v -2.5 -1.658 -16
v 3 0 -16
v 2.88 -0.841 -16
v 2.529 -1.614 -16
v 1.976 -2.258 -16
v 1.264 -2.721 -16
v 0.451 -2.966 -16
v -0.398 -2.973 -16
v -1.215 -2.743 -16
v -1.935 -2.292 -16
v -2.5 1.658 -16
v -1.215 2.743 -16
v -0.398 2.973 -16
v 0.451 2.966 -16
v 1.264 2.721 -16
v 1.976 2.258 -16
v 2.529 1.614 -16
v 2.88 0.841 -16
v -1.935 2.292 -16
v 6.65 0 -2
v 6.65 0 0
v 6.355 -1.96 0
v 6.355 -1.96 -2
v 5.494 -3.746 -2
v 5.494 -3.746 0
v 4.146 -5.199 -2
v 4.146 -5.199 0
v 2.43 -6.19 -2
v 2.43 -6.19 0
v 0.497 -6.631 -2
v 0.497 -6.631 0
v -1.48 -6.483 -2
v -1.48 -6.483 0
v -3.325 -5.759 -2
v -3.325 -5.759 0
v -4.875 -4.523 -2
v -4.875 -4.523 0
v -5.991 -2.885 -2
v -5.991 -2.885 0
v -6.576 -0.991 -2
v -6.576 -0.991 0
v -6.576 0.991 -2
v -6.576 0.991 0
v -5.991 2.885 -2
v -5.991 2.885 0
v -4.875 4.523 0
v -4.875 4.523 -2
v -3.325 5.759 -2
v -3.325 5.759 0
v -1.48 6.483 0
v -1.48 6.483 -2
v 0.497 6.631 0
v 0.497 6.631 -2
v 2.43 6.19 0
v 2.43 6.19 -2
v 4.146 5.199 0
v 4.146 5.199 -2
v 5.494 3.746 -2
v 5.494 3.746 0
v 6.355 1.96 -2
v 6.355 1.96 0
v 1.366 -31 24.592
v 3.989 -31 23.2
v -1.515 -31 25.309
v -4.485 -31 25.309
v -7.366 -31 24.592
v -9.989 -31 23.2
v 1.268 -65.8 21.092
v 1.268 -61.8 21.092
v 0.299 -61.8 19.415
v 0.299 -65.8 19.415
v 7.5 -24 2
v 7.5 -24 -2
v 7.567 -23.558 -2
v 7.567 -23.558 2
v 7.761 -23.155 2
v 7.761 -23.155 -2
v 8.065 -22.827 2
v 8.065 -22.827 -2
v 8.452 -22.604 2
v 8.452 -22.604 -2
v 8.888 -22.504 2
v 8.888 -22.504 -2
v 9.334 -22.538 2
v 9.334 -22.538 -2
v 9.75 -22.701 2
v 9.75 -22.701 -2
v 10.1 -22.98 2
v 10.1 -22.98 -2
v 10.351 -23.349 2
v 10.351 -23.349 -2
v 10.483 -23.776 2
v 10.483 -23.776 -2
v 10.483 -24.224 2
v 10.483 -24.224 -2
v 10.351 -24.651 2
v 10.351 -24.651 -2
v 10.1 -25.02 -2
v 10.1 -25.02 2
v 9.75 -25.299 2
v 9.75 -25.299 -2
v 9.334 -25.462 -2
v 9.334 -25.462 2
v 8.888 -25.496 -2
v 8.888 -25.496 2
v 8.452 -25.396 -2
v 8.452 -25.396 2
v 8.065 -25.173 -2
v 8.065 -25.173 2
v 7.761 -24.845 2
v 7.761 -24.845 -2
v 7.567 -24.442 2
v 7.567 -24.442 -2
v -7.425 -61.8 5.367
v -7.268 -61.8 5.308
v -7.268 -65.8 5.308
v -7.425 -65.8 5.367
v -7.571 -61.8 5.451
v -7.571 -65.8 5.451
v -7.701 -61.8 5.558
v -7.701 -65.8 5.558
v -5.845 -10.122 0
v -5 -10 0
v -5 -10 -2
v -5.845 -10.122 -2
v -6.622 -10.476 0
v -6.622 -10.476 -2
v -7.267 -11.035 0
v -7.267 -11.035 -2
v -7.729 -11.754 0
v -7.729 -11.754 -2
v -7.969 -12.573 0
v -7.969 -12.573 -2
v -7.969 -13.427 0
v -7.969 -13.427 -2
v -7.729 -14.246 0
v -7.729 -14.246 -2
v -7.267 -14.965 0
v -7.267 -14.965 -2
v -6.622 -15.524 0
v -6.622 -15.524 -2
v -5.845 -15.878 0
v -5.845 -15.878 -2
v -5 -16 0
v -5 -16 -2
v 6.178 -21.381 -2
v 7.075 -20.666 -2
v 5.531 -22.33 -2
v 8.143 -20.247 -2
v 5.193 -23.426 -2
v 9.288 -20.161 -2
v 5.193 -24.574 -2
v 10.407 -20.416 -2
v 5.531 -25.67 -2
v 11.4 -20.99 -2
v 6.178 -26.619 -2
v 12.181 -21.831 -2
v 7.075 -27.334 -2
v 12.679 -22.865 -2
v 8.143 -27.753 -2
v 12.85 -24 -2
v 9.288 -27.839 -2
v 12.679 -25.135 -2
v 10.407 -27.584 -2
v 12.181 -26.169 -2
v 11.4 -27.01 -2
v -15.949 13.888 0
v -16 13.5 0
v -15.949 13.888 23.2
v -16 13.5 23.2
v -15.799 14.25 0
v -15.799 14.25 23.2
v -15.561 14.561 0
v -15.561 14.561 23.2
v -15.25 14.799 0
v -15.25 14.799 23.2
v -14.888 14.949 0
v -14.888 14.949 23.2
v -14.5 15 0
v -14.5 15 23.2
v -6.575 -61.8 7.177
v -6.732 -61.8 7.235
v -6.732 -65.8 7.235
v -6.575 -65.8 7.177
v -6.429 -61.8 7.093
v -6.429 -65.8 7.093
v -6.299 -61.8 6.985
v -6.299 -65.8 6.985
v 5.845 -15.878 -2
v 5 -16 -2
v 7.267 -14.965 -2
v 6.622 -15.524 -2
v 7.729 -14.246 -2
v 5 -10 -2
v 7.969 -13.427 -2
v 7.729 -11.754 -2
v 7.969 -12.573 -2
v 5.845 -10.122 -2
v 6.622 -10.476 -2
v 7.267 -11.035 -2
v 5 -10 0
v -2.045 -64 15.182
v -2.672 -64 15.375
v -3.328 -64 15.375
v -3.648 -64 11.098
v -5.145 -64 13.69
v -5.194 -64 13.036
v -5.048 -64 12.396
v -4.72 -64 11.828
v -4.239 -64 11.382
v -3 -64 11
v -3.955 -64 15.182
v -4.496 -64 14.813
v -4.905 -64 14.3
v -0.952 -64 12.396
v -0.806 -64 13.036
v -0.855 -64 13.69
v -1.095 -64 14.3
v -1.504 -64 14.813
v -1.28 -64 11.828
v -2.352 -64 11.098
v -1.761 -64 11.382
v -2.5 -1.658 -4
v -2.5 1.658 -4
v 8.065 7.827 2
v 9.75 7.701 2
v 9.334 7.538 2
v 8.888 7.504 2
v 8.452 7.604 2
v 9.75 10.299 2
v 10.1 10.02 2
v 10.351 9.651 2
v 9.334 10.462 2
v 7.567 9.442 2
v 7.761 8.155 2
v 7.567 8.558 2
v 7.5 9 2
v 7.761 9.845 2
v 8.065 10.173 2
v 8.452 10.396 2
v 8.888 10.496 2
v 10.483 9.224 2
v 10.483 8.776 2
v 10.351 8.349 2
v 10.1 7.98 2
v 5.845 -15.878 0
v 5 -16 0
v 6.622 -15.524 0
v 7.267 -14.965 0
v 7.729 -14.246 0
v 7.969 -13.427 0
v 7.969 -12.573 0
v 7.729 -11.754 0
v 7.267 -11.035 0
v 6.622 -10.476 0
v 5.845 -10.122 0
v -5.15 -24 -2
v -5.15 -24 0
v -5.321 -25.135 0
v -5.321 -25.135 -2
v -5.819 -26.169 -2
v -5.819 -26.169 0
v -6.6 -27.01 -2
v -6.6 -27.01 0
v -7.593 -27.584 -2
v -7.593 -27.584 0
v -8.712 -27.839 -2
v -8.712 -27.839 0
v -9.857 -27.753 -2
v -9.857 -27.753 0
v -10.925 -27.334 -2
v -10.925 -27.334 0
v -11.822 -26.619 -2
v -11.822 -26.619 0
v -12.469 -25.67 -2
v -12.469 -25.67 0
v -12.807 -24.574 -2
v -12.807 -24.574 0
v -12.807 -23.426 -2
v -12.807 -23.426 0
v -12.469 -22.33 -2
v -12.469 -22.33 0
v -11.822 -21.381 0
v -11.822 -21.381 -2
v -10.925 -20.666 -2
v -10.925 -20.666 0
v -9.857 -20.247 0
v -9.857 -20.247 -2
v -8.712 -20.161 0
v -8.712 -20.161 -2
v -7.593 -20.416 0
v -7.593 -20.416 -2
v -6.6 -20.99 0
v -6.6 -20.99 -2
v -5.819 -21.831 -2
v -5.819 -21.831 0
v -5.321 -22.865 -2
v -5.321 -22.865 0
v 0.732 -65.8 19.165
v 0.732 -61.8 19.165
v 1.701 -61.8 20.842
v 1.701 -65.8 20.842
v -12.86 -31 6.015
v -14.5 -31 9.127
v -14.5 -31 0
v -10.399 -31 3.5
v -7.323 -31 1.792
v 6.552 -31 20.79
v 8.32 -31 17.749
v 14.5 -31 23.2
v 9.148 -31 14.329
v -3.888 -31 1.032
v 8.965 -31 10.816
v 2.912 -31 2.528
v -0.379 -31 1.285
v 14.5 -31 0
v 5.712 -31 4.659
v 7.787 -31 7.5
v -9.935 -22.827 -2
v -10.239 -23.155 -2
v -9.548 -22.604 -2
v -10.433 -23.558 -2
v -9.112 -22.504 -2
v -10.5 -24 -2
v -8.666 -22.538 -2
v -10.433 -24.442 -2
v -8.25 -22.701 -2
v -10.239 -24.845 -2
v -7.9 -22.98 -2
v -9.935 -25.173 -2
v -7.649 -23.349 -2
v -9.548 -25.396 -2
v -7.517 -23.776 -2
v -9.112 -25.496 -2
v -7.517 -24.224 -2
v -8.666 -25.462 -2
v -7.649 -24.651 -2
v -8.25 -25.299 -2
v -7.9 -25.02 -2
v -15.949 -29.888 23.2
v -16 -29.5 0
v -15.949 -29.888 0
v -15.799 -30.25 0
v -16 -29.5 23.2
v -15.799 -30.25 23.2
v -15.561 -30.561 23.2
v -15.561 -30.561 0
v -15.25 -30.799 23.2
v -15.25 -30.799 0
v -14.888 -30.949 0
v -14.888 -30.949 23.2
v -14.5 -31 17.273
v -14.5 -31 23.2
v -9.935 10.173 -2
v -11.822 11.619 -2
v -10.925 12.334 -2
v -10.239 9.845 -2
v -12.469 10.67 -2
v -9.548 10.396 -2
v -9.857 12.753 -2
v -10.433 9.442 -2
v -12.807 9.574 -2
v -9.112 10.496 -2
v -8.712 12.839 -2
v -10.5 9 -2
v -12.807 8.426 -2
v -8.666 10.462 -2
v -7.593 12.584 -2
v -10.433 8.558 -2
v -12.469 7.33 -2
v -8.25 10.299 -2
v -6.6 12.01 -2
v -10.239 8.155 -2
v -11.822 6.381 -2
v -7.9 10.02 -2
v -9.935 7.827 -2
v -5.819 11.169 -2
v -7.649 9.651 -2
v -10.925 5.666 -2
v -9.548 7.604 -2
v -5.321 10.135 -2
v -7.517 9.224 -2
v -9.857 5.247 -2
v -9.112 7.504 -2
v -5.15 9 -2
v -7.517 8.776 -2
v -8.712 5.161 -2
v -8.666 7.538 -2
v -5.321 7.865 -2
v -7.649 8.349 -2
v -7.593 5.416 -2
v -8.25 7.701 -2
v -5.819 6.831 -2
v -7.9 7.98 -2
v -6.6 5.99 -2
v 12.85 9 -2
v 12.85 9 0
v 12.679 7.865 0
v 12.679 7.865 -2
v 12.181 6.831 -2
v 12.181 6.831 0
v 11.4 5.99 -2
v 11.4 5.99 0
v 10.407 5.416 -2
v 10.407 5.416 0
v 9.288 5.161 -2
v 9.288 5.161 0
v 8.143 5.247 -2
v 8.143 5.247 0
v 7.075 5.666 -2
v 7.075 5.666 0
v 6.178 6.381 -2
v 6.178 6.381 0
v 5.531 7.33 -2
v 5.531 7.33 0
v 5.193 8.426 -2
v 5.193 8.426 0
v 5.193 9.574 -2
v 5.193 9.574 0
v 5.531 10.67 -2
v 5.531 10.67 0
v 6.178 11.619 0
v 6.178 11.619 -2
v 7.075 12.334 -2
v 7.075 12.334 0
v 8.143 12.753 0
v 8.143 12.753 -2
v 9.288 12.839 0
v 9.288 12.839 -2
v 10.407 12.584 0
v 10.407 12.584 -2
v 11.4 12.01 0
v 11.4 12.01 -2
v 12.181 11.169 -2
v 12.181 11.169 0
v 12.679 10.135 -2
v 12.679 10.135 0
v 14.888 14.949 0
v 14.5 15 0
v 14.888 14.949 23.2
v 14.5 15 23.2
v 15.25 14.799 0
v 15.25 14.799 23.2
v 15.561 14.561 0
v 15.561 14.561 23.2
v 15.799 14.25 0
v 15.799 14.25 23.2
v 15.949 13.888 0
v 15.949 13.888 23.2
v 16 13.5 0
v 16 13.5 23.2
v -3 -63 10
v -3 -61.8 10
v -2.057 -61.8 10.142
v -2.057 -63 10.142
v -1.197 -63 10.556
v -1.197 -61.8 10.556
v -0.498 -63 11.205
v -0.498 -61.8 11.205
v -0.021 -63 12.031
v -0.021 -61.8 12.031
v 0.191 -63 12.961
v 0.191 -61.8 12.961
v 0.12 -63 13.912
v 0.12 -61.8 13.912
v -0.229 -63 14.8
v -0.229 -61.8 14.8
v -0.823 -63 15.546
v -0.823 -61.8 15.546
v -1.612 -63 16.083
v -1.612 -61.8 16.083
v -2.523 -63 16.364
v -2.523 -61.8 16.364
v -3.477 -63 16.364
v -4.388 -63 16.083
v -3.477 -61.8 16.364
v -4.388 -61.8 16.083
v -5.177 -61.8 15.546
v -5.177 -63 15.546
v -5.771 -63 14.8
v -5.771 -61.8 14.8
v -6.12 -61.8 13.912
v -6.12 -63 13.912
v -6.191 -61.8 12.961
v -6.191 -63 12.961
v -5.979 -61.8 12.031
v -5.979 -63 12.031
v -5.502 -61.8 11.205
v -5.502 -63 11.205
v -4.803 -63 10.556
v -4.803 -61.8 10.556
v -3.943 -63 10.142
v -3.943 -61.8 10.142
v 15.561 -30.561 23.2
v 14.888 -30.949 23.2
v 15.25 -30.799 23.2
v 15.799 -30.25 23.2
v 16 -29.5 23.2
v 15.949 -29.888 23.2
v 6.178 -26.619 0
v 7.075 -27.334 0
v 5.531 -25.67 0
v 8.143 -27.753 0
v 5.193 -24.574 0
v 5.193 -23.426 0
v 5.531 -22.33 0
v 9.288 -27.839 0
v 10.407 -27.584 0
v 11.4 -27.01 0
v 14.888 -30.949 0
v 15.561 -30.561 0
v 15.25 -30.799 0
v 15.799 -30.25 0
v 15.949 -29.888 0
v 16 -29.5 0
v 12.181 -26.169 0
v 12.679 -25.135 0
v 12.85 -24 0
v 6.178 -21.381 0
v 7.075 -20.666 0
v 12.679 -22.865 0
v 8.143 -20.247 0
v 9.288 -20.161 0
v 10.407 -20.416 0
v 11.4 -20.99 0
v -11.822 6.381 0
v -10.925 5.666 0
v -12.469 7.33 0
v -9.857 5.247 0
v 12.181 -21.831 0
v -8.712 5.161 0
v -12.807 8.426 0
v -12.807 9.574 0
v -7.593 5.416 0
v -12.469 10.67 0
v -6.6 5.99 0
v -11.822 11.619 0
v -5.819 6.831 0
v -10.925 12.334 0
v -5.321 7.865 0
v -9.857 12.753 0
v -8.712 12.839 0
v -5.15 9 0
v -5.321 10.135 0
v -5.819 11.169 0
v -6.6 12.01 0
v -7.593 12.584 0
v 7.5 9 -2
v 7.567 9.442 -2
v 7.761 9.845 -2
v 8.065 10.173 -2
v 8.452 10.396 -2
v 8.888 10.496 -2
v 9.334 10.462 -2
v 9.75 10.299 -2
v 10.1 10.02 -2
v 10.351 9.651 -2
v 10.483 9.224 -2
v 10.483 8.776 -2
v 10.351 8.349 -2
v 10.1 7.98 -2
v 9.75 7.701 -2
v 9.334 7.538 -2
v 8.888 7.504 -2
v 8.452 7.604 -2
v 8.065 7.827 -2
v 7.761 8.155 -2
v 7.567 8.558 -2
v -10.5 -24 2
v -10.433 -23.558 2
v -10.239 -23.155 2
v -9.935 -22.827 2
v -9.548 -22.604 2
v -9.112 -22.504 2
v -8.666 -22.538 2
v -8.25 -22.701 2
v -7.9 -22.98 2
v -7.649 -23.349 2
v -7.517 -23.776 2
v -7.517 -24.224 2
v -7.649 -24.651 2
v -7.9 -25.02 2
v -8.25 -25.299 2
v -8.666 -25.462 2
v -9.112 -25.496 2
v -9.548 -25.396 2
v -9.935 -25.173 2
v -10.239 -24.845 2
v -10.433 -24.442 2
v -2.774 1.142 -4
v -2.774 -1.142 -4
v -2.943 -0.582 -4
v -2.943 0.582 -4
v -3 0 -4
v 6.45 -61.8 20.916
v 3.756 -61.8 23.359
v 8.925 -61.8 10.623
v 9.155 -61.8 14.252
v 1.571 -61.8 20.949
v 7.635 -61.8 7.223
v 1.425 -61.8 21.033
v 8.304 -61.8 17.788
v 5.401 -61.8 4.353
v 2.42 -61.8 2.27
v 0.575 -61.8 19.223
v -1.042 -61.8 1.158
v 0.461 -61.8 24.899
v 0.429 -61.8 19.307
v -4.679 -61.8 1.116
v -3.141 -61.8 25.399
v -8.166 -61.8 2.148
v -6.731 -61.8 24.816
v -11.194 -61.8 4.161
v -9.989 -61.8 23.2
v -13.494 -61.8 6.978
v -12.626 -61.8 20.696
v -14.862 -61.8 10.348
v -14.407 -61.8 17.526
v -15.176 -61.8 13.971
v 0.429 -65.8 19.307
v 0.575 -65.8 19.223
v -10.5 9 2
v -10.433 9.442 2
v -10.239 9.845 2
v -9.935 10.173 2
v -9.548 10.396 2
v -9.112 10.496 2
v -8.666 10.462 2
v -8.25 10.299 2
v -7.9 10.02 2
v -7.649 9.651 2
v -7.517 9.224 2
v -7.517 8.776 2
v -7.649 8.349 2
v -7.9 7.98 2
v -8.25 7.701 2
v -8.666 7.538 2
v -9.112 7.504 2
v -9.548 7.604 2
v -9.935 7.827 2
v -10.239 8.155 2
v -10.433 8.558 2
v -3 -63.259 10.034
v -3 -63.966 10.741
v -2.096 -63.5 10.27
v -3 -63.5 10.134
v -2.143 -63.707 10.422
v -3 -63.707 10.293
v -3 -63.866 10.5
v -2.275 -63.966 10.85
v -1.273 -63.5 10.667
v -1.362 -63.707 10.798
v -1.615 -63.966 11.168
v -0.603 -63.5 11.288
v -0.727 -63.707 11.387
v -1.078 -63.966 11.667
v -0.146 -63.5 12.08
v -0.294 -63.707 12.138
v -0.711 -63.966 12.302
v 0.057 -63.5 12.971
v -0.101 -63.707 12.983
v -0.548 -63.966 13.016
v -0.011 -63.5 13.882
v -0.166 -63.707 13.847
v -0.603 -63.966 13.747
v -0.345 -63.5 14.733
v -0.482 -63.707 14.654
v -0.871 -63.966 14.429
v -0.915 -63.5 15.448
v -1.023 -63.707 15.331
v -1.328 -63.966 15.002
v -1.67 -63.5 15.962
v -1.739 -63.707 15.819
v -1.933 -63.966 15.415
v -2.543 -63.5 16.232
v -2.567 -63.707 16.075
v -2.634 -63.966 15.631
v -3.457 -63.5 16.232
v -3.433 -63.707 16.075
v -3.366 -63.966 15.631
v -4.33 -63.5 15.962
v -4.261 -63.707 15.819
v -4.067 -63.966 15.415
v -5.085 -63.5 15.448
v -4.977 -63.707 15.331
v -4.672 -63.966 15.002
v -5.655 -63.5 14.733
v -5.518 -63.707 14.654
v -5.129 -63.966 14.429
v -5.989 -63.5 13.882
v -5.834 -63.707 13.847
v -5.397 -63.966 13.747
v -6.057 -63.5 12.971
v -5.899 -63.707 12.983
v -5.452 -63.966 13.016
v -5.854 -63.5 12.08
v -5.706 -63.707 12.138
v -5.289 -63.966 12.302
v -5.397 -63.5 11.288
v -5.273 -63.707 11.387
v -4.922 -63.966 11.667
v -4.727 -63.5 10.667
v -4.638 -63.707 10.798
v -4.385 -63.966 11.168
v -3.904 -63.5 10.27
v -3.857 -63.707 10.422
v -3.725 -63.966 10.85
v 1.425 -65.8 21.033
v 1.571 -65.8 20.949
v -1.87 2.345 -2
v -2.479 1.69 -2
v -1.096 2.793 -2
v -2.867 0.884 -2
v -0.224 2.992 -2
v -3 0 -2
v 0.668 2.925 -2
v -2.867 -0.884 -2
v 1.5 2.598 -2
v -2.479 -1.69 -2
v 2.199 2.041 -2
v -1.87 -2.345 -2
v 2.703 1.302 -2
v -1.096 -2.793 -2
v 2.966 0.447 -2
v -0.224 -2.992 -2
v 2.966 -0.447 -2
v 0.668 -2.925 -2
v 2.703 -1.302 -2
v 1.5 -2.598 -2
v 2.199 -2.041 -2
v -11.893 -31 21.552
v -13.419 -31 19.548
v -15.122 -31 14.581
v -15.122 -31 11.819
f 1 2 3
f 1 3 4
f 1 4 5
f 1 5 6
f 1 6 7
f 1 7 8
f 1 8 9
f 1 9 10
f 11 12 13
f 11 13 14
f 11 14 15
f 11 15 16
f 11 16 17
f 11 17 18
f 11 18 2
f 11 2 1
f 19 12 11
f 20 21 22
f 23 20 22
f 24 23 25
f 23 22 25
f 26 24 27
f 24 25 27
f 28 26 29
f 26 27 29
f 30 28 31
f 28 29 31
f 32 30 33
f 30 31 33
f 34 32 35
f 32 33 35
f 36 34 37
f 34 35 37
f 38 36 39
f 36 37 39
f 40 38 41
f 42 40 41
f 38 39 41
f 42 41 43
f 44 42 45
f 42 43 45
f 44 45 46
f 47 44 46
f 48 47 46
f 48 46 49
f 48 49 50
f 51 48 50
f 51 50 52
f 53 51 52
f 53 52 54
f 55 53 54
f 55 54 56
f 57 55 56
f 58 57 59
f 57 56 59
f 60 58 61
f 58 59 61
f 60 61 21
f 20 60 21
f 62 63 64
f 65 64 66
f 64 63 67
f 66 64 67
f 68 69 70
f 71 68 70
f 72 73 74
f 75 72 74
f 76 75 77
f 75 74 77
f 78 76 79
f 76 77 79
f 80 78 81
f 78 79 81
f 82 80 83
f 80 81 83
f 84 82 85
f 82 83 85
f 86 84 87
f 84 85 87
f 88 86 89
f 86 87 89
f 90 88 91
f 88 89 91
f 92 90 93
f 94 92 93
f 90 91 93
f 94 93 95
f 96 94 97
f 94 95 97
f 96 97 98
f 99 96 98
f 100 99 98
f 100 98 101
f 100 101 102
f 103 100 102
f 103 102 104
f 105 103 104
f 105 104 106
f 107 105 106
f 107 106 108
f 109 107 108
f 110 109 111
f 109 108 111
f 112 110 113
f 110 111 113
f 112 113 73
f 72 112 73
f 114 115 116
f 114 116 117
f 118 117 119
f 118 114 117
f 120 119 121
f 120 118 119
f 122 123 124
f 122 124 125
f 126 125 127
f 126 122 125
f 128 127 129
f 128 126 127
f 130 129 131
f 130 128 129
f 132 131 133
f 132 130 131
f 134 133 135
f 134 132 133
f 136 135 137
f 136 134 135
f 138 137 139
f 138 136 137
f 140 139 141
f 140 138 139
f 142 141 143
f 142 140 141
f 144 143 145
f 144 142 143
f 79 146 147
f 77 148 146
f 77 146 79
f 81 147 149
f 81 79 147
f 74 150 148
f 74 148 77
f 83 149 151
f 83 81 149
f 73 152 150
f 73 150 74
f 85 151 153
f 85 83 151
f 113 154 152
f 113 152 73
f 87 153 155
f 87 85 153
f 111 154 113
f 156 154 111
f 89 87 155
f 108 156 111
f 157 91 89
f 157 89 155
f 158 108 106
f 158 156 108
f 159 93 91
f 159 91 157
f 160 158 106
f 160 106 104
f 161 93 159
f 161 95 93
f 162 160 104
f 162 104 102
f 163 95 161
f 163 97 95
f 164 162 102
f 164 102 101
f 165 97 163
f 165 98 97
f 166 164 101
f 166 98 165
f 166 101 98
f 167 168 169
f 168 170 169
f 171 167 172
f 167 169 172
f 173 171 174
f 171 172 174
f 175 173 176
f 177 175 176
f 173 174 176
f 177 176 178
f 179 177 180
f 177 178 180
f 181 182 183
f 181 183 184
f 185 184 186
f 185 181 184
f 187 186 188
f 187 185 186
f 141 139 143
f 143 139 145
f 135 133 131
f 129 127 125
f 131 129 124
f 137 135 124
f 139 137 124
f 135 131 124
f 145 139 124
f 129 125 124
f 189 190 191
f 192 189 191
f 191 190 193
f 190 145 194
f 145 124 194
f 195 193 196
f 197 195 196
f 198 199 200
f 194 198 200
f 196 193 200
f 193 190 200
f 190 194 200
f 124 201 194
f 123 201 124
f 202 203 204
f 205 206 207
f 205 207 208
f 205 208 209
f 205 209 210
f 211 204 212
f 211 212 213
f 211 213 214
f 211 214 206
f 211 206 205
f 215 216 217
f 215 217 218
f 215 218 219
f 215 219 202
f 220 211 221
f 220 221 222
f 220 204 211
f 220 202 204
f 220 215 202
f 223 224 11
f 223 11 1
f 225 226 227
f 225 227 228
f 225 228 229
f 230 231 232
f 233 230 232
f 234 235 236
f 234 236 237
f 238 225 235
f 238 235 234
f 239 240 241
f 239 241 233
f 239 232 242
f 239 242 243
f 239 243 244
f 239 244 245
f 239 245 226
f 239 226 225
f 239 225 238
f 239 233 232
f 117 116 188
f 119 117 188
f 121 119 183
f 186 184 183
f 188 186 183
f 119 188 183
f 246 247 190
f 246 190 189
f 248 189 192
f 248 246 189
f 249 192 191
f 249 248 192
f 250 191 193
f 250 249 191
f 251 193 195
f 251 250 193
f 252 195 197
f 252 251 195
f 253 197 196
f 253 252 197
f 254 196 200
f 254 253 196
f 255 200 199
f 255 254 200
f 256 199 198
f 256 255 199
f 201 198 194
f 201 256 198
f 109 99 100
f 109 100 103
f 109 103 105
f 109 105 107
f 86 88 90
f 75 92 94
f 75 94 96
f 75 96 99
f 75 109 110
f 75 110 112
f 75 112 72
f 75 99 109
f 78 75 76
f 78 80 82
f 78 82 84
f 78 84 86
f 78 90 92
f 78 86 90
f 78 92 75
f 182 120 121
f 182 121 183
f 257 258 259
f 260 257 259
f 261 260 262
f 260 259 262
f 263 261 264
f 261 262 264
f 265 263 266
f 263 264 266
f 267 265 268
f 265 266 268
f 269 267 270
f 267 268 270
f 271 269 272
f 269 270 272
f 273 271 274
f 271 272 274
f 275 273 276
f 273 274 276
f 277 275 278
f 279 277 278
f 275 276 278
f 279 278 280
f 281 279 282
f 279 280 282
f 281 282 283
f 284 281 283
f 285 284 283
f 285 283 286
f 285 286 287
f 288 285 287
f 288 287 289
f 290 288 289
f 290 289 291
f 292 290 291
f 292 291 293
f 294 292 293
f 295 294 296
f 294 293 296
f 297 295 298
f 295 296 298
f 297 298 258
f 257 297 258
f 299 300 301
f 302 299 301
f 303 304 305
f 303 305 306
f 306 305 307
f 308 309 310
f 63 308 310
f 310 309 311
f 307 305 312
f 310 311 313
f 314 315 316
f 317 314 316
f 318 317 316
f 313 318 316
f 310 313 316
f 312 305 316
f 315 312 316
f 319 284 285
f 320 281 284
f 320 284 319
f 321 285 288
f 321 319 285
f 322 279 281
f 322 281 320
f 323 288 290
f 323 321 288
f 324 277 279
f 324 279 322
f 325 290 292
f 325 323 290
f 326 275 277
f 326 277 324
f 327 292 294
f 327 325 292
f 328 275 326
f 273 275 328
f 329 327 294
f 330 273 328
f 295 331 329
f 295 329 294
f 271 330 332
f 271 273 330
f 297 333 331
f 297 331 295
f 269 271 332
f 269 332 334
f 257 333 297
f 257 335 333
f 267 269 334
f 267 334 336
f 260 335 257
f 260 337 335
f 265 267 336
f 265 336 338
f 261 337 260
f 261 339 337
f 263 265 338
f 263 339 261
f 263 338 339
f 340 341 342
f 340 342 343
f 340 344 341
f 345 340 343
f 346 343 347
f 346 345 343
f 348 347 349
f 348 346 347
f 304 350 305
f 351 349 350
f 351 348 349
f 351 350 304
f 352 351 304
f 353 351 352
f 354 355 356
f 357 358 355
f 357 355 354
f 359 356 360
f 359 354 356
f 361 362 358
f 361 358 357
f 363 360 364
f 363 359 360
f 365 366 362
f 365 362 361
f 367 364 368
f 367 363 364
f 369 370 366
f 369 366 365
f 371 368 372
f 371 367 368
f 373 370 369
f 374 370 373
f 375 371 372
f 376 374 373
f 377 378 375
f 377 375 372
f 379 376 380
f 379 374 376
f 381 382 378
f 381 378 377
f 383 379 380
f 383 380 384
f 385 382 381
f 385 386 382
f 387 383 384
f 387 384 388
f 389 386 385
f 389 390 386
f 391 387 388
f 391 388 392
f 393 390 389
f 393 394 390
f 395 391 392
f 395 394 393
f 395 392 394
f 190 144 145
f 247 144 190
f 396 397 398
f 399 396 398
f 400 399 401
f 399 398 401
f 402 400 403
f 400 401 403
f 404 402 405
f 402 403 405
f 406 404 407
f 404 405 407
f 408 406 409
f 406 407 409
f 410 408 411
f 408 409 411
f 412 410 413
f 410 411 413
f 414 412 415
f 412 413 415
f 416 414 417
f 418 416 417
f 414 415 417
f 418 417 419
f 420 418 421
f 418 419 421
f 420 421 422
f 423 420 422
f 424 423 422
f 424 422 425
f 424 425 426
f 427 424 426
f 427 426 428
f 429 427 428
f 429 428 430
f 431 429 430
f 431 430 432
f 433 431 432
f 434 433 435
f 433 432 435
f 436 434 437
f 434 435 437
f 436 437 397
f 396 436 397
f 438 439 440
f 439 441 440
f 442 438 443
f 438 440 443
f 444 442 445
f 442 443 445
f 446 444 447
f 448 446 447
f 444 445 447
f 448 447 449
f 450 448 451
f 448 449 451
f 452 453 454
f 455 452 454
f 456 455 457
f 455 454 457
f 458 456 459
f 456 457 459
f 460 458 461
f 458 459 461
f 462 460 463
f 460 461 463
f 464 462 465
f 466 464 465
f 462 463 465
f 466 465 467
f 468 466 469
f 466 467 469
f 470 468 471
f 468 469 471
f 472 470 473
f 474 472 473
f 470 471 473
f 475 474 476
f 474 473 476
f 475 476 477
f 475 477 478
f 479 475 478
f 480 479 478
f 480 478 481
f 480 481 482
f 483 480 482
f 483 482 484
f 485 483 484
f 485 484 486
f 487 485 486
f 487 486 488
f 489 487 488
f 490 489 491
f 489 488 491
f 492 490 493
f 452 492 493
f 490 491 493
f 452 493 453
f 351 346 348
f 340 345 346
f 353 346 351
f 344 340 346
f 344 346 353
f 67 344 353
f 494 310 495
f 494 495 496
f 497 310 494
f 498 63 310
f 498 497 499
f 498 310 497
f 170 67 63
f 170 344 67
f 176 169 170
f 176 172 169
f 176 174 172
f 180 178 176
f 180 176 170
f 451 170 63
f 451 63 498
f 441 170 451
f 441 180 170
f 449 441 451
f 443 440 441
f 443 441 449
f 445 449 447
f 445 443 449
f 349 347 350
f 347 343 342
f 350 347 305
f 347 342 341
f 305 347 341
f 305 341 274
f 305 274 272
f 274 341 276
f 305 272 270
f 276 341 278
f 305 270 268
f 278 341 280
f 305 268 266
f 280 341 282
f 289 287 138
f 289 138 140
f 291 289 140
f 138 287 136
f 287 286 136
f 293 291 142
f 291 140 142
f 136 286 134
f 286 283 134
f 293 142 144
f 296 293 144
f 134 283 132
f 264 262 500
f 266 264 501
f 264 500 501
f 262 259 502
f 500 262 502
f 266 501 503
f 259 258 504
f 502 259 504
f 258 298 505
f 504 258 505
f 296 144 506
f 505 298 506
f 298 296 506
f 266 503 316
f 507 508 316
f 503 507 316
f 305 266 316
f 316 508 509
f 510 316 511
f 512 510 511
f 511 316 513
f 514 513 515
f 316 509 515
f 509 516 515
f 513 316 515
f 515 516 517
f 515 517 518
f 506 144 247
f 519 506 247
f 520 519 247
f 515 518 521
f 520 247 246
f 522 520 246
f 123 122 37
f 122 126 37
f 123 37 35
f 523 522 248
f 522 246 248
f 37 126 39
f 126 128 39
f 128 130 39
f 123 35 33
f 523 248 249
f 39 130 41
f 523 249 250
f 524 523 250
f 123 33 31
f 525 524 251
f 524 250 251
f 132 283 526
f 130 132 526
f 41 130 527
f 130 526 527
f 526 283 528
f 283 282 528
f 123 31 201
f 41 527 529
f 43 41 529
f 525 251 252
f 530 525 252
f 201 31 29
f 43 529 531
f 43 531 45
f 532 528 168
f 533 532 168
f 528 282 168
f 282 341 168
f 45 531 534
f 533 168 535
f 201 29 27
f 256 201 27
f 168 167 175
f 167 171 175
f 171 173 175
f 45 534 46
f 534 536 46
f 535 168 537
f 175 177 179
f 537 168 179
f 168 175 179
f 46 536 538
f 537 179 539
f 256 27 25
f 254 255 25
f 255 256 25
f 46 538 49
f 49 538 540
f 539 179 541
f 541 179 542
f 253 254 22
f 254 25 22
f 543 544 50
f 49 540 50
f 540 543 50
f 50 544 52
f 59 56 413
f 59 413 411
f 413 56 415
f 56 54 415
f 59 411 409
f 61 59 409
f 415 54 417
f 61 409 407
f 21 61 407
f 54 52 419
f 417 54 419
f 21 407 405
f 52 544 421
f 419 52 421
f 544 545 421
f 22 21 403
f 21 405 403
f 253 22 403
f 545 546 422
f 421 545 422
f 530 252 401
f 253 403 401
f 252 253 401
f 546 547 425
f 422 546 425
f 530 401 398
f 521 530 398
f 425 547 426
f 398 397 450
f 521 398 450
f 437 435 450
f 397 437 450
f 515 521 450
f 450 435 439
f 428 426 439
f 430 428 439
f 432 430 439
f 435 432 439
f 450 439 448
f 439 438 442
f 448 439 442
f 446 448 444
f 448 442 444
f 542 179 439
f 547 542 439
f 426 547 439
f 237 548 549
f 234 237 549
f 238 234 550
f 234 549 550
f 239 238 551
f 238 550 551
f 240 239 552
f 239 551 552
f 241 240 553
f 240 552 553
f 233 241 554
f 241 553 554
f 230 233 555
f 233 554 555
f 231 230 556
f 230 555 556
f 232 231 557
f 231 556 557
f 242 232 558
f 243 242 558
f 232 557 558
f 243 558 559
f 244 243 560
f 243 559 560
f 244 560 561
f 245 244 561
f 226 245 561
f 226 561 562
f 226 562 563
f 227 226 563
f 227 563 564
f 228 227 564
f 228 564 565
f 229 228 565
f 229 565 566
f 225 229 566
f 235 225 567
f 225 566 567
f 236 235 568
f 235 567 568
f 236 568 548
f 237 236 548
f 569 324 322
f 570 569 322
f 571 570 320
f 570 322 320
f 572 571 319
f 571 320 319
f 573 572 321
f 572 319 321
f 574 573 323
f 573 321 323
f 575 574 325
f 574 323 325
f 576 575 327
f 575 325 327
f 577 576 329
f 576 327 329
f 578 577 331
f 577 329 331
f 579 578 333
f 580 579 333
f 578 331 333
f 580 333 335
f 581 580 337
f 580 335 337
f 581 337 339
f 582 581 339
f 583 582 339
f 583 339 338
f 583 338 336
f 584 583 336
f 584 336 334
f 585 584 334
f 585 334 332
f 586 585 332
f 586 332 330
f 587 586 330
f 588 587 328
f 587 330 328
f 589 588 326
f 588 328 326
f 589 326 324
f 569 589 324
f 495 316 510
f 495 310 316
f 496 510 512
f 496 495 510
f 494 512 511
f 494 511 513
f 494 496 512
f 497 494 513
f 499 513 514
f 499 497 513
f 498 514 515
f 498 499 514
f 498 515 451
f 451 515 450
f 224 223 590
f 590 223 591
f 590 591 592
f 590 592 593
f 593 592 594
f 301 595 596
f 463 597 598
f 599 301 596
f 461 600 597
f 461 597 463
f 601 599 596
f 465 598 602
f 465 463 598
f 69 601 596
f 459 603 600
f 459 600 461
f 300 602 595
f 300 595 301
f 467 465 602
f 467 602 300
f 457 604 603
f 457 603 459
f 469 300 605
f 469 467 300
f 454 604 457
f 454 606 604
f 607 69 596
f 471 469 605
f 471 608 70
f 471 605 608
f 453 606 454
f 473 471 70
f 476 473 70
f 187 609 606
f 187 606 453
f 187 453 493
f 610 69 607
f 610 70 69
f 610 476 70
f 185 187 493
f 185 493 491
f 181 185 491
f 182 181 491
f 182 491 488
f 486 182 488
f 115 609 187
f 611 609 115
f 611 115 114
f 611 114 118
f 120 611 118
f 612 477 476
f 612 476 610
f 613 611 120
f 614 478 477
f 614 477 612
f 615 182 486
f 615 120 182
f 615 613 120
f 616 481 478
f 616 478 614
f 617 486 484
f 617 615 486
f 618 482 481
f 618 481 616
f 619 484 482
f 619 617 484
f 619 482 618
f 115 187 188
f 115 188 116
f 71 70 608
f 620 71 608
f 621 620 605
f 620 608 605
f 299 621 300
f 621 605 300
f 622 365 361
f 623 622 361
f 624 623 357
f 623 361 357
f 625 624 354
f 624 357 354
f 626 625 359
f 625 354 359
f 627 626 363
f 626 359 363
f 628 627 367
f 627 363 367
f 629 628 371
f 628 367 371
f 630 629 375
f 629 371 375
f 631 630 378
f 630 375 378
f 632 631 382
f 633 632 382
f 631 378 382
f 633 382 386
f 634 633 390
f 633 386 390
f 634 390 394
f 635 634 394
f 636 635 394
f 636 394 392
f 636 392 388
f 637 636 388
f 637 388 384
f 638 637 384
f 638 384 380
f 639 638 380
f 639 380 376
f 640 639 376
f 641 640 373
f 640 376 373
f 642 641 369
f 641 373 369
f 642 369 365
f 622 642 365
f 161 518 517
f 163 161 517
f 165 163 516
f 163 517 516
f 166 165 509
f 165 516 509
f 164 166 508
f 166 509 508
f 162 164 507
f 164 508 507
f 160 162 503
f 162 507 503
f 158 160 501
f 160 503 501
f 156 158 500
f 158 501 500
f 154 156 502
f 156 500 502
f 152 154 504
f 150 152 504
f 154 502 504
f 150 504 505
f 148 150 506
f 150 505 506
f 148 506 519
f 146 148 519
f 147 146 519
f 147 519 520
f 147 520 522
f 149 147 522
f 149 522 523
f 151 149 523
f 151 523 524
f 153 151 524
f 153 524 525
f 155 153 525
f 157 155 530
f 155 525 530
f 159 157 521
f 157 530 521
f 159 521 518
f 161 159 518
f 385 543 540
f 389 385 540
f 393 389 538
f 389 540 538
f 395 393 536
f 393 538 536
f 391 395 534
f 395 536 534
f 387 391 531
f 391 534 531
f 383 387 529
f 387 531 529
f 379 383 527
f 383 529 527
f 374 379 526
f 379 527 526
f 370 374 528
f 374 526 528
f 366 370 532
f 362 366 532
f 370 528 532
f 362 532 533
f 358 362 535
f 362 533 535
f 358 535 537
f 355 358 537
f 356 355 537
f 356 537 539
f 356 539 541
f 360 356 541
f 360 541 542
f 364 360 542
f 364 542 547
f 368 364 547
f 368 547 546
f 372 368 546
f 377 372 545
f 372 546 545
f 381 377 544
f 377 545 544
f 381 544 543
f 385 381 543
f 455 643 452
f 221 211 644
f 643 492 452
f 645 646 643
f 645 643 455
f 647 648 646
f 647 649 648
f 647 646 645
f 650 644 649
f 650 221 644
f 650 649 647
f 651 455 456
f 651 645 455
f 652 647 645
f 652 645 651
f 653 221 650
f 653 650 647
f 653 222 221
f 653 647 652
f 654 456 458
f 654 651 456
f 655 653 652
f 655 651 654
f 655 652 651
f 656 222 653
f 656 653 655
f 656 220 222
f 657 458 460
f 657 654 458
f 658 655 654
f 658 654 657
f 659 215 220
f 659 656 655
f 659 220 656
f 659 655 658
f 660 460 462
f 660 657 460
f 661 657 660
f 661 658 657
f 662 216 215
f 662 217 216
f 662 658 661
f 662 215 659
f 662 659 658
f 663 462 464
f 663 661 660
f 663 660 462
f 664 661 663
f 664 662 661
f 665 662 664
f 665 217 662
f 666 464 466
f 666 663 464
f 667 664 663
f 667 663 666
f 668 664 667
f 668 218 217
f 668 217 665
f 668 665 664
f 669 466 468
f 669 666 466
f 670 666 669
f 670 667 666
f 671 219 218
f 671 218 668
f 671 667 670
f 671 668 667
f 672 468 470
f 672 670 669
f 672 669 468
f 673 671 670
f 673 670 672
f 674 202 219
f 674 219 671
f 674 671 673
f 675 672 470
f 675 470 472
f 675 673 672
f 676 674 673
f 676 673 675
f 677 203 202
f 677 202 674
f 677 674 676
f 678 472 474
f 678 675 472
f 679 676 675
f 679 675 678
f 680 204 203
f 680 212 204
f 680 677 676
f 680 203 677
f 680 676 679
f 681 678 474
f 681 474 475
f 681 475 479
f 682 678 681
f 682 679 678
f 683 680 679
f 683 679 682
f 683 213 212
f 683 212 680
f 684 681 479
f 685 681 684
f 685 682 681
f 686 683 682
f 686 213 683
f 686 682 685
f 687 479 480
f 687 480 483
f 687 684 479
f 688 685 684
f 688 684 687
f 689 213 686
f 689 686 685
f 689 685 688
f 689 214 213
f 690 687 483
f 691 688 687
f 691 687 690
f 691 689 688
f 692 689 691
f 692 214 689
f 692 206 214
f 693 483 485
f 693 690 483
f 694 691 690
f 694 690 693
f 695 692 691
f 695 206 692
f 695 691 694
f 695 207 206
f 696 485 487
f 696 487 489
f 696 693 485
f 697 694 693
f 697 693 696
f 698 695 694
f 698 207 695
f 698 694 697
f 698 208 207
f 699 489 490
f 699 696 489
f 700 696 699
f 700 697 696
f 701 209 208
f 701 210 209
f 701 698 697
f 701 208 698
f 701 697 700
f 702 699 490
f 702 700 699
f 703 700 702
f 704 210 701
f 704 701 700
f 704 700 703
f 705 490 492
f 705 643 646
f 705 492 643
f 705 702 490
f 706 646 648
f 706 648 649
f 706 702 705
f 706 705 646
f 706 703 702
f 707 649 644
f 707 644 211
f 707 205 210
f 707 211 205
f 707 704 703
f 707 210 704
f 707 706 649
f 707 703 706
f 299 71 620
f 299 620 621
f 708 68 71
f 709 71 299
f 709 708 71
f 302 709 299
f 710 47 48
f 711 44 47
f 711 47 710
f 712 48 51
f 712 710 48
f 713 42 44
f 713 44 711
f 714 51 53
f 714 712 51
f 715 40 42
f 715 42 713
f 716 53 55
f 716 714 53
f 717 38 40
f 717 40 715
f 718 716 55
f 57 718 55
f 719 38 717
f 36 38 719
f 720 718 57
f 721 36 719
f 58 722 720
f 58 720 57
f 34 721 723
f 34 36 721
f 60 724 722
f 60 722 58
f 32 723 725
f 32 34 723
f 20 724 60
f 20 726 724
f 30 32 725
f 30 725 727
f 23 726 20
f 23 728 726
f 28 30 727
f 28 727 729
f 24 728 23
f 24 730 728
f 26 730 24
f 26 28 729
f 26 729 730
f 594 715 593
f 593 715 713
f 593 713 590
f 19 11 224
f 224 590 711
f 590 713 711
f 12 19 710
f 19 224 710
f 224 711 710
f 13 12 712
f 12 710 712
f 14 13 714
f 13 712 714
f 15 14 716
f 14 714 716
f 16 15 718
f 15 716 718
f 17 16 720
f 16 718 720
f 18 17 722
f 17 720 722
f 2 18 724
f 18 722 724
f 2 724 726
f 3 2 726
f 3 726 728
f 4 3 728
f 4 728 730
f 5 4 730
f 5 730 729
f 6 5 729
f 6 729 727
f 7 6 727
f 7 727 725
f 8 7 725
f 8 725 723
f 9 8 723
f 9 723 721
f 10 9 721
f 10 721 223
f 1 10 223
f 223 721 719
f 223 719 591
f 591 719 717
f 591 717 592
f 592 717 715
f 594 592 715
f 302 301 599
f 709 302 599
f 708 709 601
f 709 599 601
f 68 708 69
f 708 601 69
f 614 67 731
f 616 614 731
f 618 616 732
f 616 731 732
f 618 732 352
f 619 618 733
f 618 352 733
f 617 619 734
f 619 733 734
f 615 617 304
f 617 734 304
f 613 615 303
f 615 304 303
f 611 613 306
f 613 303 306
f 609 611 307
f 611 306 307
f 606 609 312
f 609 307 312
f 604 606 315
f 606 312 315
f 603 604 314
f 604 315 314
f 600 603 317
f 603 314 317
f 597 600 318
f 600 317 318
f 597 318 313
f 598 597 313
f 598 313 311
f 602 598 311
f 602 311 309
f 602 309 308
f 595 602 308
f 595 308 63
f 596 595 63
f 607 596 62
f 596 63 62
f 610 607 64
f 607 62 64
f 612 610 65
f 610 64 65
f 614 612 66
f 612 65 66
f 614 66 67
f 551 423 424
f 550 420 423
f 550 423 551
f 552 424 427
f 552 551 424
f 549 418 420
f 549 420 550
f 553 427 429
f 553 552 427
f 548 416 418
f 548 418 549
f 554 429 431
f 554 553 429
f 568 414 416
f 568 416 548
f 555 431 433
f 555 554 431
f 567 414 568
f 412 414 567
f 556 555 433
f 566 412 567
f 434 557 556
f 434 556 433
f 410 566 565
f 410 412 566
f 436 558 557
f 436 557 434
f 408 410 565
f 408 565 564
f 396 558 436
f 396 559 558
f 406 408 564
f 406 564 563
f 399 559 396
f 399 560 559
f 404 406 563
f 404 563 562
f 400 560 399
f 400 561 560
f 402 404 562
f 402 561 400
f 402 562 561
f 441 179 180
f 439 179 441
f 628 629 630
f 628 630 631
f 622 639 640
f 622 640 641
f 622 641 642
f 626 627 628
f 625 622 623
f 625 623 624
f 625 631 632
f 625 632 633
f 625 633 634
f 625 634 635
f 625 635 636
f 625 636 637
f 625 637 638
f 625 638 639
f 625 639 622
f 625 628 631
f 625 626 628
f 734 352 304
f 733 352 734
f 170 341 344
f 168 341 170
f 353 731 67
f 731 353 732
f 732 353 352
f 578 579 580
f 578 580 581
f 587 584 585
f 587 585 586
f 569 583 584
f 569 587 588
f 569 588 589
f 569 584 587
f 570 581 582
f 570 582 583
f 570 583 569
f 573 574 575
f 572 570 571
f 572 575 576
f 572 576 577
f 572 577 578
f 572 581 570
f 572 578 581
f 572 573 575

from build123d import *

# Parameters (mm, degrees)
SKETCH1_W           = 32
SKETCH1_H           = 46
BOSS_EXTRUDE1_DEPTH = 23.2
SKETCH2_R           = 3.85
SKETCH2_R_2         = 6.65
BOSS_EXTRUDE2_DEPTH = 2
SKETCH3_R           = 1.5
CUT_EXTRUDE1_DEPTH  = 4
SKETCH4_R           = 3
BOSS_EXTRUDE3_DEPTH = 14
CUT_EXTRUDE2_START  = -12
CUT_EXTRUDE2_DEPTH  = 12
FILLET1_R           = 1.5
SKETCH6_R           = 12.2
BOSS_EXTRUDE4_DEPTH = 30.8
SKETCH7_R           = 3.2
BOSS_EXTRUDE5_DEPTH = 2.2
FILLET2_R           = 1
BOSS_EXTRUDE6_DEPTH = 4


with BuildPart() as part:
    # Sketch1 → Boss-Extrude1 (new body)
    with BuildSketch(Plane.XY):
        with Locations((0, -8)):
            Rectangle(SKETCH1_W, SKETCH1_H)
    extrude(amount=BOSS_EXTRUDE1_DEPTH)

    # Sketch2 → Boss-Extrude2 (add)
    with BuildSketch(Plane(origin=(0, 0, 0), x_dir=(-1, 0, 0), z_dir=(0, 0, -1))):
        with Locations(Location((-9, 9, 0), (0, 0, 180))):
            Circle(SKETCH2_R)
        with Locations(Location((9, 9, 0), (0, 0, 180))):
            Circle(SKETCH2_R)
        with Locations(Location((-9, -24, 0), (0, 0, 180))):
            Circle(SKETCH2_R)
        with Locations(Location((9, -24, 0), (0, 0, 180))):
            Circle(SKETCH2_R)
        with Locations(Location((0, 0, 0), (0, 0, 180))):
            Circle(SKETCH2_R_2)
        with BuildLine():
            Line((-5, -10), (5, -10))
            ThreePointArc((5, -10), (8, -13), (5, -16))
            Line((5, -16), (-5, -16))
            ThreePointArc((-5, -16), (-8, -13), (-5, -10))
        make_face()
    extrude(amount=BOSS_EXTRUDE2_DEPTH)

    # Sketch3 → Cut-Extrude1 (cut)
    with BuildSketch(Plane(origin=(0, 0, -2), x_dir=(-1, 0, 0), z_dir=(0, 0, -1))):
        with Locations((9, 9)):
            Circle(SKETCH3_R)
        with Locations((-9, 9)):
            Circle(SKETCH3_R)
        with Locations((-9, -24)):
            Circle(SKETCH3_R)
        with Locations((9, -24)):
            Circle(SKETCH3_R)
    extrude(amount=-CUT_EXTRUDE1_DEPTH, mode=Mode.SUBTRACT)

    # Sketch4 → Boss-Extrude3 (add)
    with BuildSketch(Plane(origin=(0, 0, -2), x_dir=(-1, 0, 0), z_dir=(0, 0, -1))):
        Circle(SKETCH4_R)
    extrude(amount=BOSS_EXTRUDE3_DEPTH)

    # Sketch5 → Cut-Extrude2 (cut)
    with BuildSketch(Plane(origin=(0, 0, -16), x_dir=(-1, 0, 0), z_dir=(0, 0, -1)).offset(CUT_EXTRUDE2_START)):
        with BuildLine():
            Line((2.5, 1.658312395), (2.5, -1.658312395))
            ThreePointArc((2.5, -1.658312395), (2.872281323, -0.866025404), (3, 0))
            ThreePointArc((3, 0), (2.872281323, 0.866025404), (2.5, 1.658312395))
        make_face()
    extrude(amount=CUT_EXTRUDE2_DEPTH, mode=Mode.SUBTRACT)

    # Fillet1
    fillet1_edges = [part.edges().sort_by_distance(p)[0] for p in [
        (-16, 15, 11.6),
        (16, 15, 11.6),
        (16, -31, 11.6),
        (-16, -31, 11.6),
    ]]
    fillet(fillet1_edges, radius=FILLET1_R)

    # Sketch6 → Boss-Extrude4 (add)
    with BuildSketch(Plane.XZ.offset(31)):
        with Locations(Location((-3, 13.2, 0), (0, 0, 124.94801372))):
            Circle(SKETCH6_R)
    extrude(amount=BOSS_EXTRUDE4_DEPTH)

    # Sketch7 → Boss-Extrude5 (add)
    with BuildSketch(Plane.XZ.offset(61.8)):
        with Locations(Location((-3, 13.2, 0), (0, 0, 270))):
            Circle(SKETCH7_R)
    extrude(amount=BOSS_EXTRUDE5_DEPTH)

    # Fillet2
    fillet2_edges = [part.edges().sort_by_distance(p)[0] for p in [
        (-3, -64, 16.4),
    ]]
    fillet(fillet2_edges, radius=FILLET2_R)

    # Sketch8 → Boss-Extrude6 (add)
    with BuildSketch(Plane.XZ.offset(61.8)):
        with BuildLine():
            Line((1.267616567, 21.091728722), (0.299370731, 19.414677739))
            ThreePointArc((0.299370731, 19.414677739), (0.5, 19.262177826), (0.732383433, 19.164677739))
            Line((0.732383433, 19.164677739), (1.700629269, 20.841728722))
            ThreePointArc((1.700629269, 20.841728722), (1.5, 20.994228634), (1.267616567, 21.091728722))
        make_face()
        with BuildLine():
            Line((-6.299370731, 6.985322261), (-7.267616567, 5.308271278))
            ThreePointArc((-7.267616567, 5.308271278), (-7.5, 5.405771366), (-7.700629269, 5.558271278))
            Line((-7.700629269, 5.558271278), (-6.732383433, 7.235322261))
            ThreePointArc((-6.732383433, 7.235322261), (-6.5, 7.137822174), (-6.299370731, 6.985322261))
        make_face()
    extrude(amount=BOSS_EXTRUDE6_DEPTH)


solid = part.part
